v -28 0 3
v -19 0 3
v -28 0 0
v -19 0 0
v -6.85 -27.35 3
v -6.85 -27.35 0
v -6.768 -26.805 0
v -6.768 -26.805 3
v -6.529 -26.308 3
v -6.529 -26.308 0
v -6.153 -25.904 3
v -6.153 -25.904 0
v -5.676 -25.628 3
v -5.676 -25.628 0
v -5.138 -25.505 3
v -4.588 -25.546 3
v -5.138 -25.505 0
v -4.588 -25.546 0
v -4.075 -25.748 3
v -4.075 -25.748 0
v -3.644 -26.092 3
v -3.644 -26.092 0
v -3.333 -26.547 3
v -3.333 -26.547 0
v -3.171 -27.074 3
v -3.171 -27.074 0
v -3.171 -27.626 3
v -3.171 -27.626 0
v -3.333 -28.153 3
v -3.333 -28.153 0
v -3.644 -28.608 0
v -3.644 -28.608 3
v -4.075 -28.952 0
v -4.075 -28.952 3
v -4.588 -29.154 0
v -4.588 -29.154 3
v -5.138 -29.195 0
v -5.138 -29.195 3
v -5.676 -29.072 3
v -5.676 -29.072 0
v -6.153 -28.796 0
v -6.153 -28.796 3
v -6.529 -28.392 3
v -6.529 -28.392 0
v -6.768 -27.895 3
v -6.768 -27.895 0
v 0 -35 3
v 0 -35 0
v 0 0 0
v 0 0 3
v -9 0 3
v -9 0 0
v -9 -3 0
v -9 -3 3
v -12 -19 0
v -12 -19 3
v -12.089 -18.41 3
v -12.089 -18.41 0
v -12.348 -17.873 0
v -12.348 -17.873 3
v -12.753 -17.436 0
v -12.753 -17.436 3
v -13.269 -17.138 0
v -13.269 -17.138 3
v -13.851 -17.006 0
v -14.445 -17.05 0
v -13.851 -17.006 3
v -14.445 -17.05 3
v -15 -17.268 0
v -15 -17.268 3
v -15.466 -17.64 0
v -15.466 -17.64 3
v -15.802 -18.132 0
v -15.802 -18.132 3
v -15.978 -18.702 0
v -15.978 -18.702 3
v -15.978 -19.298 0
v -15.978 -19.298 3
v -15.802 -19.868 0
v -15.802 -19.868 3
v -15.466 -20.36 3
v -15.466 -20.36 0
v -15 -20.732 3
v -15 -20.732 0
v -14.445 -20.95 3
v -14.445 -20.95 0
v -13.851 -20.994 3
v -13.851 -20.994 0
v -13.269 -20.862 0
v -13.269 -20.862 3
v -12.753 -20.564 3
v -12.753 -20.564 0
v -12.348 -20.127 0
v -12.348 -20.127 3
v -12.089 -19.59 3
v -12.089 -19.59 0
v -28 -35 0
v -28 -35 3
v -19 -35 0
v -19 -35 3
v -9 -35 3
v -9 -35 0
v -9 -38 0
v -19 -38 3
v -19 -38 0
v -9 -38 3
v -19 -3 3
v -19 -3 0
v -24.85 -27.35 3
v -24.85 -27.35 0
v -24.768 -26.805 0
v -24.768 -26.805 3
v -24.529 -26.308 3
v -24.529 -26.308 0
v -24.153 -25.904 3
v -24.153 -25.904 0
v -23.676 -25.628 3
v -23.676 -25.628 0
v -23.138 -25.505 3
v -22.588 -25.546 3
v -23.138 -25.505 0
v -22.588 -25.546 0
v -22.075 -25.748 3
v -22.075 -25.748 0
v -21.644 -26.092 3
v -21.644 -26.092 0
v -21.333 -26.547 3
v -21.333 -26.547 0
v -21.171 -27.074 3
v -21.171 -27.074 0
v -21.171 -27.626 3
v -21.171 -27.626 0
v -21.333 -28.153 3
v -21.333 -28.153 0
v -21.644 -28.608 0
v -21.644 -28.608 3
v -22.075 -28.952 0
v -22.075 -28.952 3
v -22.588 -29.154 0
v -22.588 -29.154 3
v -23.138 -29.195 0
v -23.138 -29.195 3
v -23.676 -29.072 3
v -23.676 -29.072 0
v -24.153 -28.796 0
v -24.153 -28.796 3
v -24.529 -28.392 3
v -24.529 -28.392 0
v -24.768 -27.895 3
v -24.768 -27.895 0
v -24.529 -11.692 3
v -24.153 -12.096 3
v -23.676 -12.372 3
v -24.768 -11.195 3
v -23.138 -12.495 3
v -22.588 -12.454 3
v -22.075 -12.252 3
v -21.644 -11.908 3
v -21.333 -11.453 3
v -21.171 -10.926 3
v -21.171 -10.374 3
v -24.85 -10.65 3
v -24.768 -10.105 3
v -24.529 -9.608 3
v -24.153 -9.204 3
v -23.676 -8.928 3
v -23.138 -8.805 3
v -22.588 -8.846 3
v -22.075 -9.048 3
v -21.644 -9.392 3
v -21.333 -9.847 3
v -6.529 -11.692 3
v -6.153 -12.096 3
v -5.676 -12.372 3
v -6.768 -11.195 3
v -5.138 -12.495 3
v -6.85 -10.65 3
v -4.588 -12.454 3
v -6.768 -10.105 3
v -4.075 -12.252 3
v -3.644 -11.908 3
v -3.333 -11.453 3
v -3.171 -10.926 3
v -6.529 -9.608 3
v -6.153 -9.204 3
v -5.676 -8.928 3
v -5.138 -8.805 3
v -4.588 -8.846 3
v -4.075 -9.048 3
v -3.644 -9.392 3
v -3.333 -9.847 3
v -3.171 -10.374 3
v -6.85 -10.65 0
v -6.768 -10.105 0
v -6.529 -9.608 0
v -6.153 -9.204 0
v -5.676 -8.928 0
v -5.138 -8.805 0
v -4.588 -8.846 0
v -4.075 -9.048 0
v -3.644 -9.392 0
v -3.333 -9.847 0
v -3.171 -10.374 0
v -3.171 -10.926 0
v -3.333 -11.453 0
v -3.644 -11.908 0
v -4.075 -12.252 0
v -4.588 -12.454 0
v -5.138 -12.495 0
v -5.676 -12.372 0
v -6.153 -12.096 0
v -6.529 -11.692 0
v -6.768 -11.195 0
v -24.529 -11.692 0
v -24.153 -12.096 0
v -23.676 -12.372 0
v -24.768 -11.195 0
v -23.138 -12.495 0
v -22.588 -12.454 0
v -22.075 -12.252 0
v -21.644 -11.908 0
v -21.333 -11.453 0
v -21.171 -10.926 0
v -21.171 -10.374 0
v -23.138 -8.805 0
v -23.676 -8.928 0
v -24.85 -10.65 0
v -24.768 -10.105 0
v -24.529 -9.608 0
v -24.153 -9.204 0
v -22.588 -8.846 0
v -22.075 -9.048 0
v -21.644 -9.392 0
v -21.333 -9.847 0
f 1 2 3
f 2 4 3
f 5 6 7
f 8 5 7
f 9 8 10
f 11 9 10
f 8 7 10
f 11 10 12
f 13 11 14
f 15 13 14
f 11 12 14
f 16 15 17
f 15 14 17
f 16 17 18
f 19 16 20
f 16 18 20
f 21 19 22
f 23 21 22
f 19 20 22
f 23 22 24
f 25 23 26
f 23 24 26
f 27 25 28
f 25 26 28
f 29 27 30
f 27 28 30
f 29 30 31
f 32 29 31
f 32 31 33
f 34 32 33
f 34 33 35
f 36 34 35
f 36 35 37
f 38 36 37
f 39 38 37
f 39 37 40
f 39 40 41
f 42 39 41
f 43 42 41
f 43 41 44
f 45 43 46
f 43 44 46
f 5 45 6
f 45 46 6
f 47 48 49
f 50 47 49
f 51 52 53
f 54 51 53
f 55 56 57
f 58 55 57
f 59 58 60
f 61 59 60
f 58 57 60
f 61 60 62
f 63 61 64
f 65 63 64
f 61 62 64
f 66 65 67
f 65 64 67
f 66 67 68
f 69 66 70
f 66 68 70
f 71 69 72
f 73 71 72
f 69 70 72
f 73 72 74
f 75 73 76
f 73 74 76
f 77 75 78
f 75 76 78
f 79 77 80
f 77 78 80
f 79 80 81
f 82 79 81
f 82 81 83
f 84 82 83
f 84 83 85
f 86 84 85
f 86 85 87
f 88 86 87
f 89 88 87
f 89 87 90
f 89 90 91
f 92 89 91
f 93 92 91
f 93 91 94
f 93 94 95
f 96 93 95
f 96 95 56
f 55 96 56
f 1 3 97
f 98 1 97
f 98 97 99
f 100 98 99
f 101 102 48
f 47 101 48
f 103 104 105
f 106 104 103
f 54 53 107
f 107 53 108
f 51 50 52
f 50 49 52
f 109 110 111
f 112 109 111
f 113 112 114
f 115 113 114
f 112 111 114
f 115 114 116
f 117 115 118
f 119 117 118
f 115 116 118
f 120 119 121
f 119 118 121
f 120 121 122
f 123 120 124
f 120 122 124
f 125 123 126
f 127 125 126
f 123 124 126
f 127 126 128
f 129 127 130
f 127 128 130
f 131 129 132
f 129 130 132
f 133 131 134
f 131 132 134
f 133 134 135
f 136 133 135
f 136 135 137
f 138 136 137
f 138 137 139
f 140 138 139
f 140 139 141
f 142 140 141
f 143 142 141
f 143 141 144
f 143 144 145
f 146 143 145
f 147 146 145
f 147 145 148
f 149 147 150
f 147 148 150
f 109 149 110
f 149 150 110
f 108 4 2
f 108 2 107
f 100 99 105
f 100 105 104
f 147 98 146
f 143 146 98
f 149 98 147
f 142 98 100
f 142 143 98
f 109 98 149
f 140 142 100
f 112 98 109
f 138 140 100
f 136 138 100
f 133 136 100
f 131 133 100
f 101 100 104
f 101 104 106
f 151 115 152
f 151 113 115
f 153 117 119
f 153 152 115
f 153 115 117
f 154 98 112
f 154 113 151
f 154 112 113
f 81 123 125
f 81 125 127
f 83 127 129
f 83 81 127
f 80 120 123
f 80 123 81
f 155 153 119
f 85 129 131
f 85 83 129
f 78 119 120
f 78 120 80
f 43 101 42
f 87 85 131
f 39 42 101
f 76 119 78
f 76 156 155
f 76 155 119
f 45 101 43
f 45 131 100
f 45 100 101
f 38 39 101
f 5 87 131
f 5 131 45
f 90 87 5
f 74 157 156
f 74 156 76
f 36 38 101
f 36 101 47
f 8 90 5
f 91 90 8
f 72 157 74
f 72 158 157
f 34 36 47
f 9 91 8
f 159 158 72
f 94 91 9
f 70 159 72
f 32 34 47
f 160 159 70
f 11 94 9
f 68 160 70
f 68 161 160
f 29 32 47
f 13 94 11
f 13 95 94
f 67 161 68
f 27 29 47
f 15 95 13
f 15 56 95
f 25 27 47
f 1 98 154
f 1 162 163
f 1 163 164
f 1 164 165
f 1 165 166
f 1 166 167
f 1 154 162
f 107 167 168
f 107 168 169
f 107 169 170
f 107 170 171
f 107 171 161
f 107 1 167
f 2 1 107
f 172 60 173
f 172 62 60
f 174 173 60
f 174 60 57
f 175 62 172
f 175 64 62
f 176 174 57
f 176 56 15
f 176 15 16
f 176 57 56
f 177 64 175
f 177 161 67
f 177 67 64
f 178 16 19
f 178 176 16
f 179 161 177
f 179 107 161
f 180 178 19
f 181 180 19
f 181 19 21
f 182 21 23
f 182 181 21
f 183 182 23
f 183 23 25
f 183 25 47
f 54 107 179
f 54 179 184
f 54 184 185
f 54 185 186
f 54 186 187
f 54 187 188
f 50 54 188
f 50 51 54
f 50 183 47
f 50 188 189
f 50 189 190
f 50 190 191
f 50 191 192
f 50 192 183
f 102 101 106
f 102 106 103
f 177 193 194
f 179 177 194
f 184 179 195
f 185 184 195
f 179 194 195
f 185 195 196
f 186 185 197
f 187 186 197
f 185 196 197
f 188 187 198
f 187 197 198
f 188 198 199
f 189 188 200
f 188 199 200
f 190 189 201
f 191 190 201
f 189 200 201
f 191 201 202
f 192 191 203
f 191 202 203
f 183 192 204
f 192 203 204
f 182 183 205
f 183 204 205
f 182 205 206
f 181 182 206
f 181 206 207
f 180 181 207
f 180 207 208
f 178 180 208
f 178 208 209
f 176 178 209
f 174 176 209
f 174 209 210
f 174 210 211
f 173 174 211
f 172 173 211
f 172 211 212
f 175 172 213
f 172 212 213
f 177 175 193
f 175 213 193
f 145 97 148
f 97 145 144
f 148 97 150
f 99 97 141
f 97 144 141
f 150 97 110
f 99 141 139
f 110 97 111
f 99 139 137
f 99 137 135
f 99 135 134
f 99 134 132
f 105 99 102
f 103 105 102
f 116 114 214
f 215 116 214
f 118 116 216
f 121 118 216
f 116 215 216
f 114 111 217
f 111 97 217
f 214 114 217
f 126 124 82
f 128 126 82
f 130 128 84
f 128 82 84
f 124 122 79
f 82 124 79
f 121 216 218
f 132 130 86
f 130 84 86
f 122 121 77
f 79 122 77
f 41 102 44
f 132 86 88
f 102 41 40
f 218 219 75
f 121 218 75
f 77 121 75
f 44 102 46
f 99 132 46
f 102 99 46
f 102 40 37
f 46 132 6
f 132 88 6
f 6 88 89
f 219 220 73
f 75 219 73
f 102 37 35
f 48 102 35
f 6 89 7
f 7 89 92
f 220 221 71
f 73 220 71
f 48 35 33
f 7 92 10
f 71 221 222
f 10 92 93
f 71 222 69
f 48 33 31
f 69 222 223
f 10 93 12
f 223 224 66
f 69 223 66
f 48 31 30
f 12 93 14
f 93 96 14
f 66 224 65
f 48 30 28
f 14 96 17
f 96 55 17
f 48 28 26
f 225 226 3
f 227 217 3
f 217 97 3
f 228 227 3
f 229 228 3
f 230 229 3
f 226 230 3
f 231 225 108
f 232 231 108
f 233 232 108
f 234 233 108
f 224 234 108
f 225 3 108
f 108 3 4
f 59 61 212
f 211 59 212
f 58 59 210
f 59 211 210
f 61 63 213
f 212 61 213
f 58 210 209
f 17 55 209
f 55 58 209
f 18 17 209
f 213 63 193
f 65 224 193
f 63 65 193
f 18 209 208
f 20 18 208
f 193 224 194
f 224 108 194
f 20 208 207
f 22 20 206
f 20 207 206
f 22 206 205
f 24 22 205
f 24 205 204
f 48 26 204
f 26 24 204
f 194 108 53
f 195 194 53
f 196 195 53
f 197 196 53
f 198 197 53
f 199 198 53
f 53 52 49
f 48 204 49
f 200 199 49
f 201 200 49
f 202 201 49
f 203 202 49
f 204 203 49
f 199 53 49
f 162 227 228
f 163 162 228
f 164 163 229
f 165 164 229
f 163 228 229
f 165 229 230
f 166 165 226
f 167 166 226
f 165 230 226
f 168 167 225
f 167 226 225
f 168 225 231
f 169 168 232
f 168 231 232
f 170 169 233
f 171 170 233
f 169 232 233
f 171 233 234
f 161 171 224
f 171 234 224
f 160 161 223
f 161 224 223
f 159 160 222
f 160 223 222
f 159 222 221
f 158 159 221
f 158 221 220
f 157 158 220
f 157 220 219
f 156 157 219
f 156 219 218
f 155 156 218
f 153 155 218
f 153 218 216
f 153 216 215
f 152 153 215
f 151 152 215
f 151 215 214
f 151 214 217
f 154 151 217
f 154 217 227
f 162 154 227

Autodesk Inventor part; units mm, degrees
ref_plane "YZ Plane" through (0, 0, 0) normal (1, 0, 0) x (0, 1, 0)
ref_plane "XZ Plane" through (0, 0, 0) normal (0, 1, 0) x (-1, 0, 0)
ref_plane "XY Plane" through (0, 0, 0) normal (0, 0, 1) x (1, 0, 0)
sketch "Sketch1" plane through (0, 0, 0) normal (0, 0, 1) x (1, 0, 0)
  line L0 (-9, 0) -> (0, 0) construction
  line L1 (-19, 0) -> (-9, 0) construction
  line L2 (-28, 0) -> (-19, 0) construction
  line L3 (0, 0) -> (-28, 0)
  line L4 (-28, 0) -> (-28, -35)
  line L5 (-28, -35) -> (0, -35)
  line L6 (0, -35) -> (0, 0)
  line L7 (-19, 0) -> (-9, 0) projected
  line L8 (-19, 0) -> (-19, -3) projected
  line L9 (-9, -3) -> (-19, -3) projected
  line L10 (-9, 0) -> (-9, -3) projected
  dimension "d0" = 35
extrude "Extrusion1" add sketch "Sketch1" along normal blind 3 contours L6 L5 L4 L3 L8 L9 L10
sketch "Sketch2" plane through (0, 0, 0) normal (0, 0, -1) x (-1, 0, 0)
  arc A0 (6.85, -9.25) -> (3.15, -9.25) centre (5, -9.25) ccw construction
  line L0 (6.85, -9.25) -> (6.85, -12.05) construction
  arc A1 (3.15, -12.05) -> (6.85, -12.05) centre (5, -12.05) ccw construction
  line L1 (3.15, -12.05) -> (3.15, -9.25) construction
  line L2 (21.15, -12.05) -> (21.15, -9.25) construction
  arc A2 (21.15, -12.05) -> (24.85, -12.05) centre (23, -12.05) ccw construction
  line L3 (24.85, -9.25) -> (24.85, -12.05) construction
  arc A3 (24.85, -9.25) -> (21.15, -9.25) centre (23, -9.25) ccw construction
  line L4 (5, -12.05) -> (5, -9.25) construction
  line L5 (5, -10.65) -> (3.15, -10.65) construction
  line L6 (23, -12.05) -> (23, -9.25) construction
  line L7 (23, -10.65) -> (21.15, -10.65) construction
  circle A4 centre (5, -10.65) radius 1.85
  circle A5 centre (23, -10.65) radius 1.85
  point P0 (0, 0)
extrude "Extrusion2" cut sketch "Sketch2" against normal blind 6.175
sketch "Sketch3" plane through (0, 0, 3) normal (0, 0, 1) x (1, 0, 0)
  line L0 (-9, -3) -> (-19, -3) projected
  line L1 (-28, -35) -> (0, -35) projected
  line L2 (-14, -3) -> (-14, -35) construction
  line L3 (-28, -35) -> (0, -35) construction
  line L4 (-14, -19) -> (0, -19) construction
  line L5 (0, -35) -> (0, 0) construction
  circle A0 centre (-14, -19) radius 2
  dimension "d5" = 4
extrude "Extrusion3" cut sketch "Sketch3" against normal blind 6.175
sketch "Sketch4" plane through (-28, -35, 0) normal (0, -1, 0) x (1, 0, 0)
  line L0 (9, 3) -> (19, 3) projected
  line L1 (19, 3) -> (19, 0) projected
  line L2 (9, 0) -> (19, 0) projected
  line L3 (9, 0) -> (9, 3) projected
  point P0 (28, 0)
extrude "Extrusion4" add sketch "Sketch4" along normal blind 3
sketch "Sketch5" plane through (0, 0, 0) normal (0, 0, -1) x (-1, 0, 0)
  arc A0 (6.85, -25.95) -> (3.15, -25.95) centre (5, -25.95) ccw construction
  line L0 (6.85, -25.95) -> (6.85, -28.75) construction
  arc A1 (3.15, -28.75) -> (6.85, -28.75) centre (5, -28.75) ccw construction
  line L1 (3.15, -28.75) -> (3.15, -25.95) construction
  arc A2 (1, -20.4) -> (0, -21.4) centre (1, -21.4) ccw construction
  line L2 (0, -21.4) -> (0, -34) construction
  line L3 (0, -34) -> (10, -34) construction
  line L4 (10, -34) -> (10, -21.4) construction
  arc A3 (10, -21.4) -> (9, -20.4) centre (9, -21.4) ccw construction
  line L5 (9, -20.4) -> (1, -20.4) construction
  arc A4 (24.85, -25.95) -> (21.15, -25.95) centre (23, -25.95) ccw construction
  line L6 (24.85, -25.95) -> (24.85, -28.75) construction
  arc A5 (21.15, -28.75) -> (24.85, -28.75) centre (23, -28.75) ccw construction
  line L7 (21.15, -28.75) -> (21.15, -25.95) construction
  arc A6 (19, -20.4) -> (18, -21.4) centre (19, -21.4) ccw construction
  line L8 (18, -21.4) -> (18, -34) construction
  line L9 (18, -34) -> (28, -34) construction
  line L10 (28, -34) -> (28, -21.4) construction
  arc A7 (28, -21.4) -> (27, -20.4) centre (27, -21.4) ccw construction
  line L11 (27, -20.4) -> (19, -20.4) construction
  line L12 (5, -28.75) -> (5, -25.95) construction
  line L13 (23, -28.75) -> (23, -25.95) construction
  circle A8 centre (5, -27.35) radius 1.85
  circle A9 centre (23, -27.35) radius 1.85
  point P0 (0, 0)
extrude "Extrusion5" cut sketch "Sketch5" against normal blind 3
properties part number "Camera mount side bars"
